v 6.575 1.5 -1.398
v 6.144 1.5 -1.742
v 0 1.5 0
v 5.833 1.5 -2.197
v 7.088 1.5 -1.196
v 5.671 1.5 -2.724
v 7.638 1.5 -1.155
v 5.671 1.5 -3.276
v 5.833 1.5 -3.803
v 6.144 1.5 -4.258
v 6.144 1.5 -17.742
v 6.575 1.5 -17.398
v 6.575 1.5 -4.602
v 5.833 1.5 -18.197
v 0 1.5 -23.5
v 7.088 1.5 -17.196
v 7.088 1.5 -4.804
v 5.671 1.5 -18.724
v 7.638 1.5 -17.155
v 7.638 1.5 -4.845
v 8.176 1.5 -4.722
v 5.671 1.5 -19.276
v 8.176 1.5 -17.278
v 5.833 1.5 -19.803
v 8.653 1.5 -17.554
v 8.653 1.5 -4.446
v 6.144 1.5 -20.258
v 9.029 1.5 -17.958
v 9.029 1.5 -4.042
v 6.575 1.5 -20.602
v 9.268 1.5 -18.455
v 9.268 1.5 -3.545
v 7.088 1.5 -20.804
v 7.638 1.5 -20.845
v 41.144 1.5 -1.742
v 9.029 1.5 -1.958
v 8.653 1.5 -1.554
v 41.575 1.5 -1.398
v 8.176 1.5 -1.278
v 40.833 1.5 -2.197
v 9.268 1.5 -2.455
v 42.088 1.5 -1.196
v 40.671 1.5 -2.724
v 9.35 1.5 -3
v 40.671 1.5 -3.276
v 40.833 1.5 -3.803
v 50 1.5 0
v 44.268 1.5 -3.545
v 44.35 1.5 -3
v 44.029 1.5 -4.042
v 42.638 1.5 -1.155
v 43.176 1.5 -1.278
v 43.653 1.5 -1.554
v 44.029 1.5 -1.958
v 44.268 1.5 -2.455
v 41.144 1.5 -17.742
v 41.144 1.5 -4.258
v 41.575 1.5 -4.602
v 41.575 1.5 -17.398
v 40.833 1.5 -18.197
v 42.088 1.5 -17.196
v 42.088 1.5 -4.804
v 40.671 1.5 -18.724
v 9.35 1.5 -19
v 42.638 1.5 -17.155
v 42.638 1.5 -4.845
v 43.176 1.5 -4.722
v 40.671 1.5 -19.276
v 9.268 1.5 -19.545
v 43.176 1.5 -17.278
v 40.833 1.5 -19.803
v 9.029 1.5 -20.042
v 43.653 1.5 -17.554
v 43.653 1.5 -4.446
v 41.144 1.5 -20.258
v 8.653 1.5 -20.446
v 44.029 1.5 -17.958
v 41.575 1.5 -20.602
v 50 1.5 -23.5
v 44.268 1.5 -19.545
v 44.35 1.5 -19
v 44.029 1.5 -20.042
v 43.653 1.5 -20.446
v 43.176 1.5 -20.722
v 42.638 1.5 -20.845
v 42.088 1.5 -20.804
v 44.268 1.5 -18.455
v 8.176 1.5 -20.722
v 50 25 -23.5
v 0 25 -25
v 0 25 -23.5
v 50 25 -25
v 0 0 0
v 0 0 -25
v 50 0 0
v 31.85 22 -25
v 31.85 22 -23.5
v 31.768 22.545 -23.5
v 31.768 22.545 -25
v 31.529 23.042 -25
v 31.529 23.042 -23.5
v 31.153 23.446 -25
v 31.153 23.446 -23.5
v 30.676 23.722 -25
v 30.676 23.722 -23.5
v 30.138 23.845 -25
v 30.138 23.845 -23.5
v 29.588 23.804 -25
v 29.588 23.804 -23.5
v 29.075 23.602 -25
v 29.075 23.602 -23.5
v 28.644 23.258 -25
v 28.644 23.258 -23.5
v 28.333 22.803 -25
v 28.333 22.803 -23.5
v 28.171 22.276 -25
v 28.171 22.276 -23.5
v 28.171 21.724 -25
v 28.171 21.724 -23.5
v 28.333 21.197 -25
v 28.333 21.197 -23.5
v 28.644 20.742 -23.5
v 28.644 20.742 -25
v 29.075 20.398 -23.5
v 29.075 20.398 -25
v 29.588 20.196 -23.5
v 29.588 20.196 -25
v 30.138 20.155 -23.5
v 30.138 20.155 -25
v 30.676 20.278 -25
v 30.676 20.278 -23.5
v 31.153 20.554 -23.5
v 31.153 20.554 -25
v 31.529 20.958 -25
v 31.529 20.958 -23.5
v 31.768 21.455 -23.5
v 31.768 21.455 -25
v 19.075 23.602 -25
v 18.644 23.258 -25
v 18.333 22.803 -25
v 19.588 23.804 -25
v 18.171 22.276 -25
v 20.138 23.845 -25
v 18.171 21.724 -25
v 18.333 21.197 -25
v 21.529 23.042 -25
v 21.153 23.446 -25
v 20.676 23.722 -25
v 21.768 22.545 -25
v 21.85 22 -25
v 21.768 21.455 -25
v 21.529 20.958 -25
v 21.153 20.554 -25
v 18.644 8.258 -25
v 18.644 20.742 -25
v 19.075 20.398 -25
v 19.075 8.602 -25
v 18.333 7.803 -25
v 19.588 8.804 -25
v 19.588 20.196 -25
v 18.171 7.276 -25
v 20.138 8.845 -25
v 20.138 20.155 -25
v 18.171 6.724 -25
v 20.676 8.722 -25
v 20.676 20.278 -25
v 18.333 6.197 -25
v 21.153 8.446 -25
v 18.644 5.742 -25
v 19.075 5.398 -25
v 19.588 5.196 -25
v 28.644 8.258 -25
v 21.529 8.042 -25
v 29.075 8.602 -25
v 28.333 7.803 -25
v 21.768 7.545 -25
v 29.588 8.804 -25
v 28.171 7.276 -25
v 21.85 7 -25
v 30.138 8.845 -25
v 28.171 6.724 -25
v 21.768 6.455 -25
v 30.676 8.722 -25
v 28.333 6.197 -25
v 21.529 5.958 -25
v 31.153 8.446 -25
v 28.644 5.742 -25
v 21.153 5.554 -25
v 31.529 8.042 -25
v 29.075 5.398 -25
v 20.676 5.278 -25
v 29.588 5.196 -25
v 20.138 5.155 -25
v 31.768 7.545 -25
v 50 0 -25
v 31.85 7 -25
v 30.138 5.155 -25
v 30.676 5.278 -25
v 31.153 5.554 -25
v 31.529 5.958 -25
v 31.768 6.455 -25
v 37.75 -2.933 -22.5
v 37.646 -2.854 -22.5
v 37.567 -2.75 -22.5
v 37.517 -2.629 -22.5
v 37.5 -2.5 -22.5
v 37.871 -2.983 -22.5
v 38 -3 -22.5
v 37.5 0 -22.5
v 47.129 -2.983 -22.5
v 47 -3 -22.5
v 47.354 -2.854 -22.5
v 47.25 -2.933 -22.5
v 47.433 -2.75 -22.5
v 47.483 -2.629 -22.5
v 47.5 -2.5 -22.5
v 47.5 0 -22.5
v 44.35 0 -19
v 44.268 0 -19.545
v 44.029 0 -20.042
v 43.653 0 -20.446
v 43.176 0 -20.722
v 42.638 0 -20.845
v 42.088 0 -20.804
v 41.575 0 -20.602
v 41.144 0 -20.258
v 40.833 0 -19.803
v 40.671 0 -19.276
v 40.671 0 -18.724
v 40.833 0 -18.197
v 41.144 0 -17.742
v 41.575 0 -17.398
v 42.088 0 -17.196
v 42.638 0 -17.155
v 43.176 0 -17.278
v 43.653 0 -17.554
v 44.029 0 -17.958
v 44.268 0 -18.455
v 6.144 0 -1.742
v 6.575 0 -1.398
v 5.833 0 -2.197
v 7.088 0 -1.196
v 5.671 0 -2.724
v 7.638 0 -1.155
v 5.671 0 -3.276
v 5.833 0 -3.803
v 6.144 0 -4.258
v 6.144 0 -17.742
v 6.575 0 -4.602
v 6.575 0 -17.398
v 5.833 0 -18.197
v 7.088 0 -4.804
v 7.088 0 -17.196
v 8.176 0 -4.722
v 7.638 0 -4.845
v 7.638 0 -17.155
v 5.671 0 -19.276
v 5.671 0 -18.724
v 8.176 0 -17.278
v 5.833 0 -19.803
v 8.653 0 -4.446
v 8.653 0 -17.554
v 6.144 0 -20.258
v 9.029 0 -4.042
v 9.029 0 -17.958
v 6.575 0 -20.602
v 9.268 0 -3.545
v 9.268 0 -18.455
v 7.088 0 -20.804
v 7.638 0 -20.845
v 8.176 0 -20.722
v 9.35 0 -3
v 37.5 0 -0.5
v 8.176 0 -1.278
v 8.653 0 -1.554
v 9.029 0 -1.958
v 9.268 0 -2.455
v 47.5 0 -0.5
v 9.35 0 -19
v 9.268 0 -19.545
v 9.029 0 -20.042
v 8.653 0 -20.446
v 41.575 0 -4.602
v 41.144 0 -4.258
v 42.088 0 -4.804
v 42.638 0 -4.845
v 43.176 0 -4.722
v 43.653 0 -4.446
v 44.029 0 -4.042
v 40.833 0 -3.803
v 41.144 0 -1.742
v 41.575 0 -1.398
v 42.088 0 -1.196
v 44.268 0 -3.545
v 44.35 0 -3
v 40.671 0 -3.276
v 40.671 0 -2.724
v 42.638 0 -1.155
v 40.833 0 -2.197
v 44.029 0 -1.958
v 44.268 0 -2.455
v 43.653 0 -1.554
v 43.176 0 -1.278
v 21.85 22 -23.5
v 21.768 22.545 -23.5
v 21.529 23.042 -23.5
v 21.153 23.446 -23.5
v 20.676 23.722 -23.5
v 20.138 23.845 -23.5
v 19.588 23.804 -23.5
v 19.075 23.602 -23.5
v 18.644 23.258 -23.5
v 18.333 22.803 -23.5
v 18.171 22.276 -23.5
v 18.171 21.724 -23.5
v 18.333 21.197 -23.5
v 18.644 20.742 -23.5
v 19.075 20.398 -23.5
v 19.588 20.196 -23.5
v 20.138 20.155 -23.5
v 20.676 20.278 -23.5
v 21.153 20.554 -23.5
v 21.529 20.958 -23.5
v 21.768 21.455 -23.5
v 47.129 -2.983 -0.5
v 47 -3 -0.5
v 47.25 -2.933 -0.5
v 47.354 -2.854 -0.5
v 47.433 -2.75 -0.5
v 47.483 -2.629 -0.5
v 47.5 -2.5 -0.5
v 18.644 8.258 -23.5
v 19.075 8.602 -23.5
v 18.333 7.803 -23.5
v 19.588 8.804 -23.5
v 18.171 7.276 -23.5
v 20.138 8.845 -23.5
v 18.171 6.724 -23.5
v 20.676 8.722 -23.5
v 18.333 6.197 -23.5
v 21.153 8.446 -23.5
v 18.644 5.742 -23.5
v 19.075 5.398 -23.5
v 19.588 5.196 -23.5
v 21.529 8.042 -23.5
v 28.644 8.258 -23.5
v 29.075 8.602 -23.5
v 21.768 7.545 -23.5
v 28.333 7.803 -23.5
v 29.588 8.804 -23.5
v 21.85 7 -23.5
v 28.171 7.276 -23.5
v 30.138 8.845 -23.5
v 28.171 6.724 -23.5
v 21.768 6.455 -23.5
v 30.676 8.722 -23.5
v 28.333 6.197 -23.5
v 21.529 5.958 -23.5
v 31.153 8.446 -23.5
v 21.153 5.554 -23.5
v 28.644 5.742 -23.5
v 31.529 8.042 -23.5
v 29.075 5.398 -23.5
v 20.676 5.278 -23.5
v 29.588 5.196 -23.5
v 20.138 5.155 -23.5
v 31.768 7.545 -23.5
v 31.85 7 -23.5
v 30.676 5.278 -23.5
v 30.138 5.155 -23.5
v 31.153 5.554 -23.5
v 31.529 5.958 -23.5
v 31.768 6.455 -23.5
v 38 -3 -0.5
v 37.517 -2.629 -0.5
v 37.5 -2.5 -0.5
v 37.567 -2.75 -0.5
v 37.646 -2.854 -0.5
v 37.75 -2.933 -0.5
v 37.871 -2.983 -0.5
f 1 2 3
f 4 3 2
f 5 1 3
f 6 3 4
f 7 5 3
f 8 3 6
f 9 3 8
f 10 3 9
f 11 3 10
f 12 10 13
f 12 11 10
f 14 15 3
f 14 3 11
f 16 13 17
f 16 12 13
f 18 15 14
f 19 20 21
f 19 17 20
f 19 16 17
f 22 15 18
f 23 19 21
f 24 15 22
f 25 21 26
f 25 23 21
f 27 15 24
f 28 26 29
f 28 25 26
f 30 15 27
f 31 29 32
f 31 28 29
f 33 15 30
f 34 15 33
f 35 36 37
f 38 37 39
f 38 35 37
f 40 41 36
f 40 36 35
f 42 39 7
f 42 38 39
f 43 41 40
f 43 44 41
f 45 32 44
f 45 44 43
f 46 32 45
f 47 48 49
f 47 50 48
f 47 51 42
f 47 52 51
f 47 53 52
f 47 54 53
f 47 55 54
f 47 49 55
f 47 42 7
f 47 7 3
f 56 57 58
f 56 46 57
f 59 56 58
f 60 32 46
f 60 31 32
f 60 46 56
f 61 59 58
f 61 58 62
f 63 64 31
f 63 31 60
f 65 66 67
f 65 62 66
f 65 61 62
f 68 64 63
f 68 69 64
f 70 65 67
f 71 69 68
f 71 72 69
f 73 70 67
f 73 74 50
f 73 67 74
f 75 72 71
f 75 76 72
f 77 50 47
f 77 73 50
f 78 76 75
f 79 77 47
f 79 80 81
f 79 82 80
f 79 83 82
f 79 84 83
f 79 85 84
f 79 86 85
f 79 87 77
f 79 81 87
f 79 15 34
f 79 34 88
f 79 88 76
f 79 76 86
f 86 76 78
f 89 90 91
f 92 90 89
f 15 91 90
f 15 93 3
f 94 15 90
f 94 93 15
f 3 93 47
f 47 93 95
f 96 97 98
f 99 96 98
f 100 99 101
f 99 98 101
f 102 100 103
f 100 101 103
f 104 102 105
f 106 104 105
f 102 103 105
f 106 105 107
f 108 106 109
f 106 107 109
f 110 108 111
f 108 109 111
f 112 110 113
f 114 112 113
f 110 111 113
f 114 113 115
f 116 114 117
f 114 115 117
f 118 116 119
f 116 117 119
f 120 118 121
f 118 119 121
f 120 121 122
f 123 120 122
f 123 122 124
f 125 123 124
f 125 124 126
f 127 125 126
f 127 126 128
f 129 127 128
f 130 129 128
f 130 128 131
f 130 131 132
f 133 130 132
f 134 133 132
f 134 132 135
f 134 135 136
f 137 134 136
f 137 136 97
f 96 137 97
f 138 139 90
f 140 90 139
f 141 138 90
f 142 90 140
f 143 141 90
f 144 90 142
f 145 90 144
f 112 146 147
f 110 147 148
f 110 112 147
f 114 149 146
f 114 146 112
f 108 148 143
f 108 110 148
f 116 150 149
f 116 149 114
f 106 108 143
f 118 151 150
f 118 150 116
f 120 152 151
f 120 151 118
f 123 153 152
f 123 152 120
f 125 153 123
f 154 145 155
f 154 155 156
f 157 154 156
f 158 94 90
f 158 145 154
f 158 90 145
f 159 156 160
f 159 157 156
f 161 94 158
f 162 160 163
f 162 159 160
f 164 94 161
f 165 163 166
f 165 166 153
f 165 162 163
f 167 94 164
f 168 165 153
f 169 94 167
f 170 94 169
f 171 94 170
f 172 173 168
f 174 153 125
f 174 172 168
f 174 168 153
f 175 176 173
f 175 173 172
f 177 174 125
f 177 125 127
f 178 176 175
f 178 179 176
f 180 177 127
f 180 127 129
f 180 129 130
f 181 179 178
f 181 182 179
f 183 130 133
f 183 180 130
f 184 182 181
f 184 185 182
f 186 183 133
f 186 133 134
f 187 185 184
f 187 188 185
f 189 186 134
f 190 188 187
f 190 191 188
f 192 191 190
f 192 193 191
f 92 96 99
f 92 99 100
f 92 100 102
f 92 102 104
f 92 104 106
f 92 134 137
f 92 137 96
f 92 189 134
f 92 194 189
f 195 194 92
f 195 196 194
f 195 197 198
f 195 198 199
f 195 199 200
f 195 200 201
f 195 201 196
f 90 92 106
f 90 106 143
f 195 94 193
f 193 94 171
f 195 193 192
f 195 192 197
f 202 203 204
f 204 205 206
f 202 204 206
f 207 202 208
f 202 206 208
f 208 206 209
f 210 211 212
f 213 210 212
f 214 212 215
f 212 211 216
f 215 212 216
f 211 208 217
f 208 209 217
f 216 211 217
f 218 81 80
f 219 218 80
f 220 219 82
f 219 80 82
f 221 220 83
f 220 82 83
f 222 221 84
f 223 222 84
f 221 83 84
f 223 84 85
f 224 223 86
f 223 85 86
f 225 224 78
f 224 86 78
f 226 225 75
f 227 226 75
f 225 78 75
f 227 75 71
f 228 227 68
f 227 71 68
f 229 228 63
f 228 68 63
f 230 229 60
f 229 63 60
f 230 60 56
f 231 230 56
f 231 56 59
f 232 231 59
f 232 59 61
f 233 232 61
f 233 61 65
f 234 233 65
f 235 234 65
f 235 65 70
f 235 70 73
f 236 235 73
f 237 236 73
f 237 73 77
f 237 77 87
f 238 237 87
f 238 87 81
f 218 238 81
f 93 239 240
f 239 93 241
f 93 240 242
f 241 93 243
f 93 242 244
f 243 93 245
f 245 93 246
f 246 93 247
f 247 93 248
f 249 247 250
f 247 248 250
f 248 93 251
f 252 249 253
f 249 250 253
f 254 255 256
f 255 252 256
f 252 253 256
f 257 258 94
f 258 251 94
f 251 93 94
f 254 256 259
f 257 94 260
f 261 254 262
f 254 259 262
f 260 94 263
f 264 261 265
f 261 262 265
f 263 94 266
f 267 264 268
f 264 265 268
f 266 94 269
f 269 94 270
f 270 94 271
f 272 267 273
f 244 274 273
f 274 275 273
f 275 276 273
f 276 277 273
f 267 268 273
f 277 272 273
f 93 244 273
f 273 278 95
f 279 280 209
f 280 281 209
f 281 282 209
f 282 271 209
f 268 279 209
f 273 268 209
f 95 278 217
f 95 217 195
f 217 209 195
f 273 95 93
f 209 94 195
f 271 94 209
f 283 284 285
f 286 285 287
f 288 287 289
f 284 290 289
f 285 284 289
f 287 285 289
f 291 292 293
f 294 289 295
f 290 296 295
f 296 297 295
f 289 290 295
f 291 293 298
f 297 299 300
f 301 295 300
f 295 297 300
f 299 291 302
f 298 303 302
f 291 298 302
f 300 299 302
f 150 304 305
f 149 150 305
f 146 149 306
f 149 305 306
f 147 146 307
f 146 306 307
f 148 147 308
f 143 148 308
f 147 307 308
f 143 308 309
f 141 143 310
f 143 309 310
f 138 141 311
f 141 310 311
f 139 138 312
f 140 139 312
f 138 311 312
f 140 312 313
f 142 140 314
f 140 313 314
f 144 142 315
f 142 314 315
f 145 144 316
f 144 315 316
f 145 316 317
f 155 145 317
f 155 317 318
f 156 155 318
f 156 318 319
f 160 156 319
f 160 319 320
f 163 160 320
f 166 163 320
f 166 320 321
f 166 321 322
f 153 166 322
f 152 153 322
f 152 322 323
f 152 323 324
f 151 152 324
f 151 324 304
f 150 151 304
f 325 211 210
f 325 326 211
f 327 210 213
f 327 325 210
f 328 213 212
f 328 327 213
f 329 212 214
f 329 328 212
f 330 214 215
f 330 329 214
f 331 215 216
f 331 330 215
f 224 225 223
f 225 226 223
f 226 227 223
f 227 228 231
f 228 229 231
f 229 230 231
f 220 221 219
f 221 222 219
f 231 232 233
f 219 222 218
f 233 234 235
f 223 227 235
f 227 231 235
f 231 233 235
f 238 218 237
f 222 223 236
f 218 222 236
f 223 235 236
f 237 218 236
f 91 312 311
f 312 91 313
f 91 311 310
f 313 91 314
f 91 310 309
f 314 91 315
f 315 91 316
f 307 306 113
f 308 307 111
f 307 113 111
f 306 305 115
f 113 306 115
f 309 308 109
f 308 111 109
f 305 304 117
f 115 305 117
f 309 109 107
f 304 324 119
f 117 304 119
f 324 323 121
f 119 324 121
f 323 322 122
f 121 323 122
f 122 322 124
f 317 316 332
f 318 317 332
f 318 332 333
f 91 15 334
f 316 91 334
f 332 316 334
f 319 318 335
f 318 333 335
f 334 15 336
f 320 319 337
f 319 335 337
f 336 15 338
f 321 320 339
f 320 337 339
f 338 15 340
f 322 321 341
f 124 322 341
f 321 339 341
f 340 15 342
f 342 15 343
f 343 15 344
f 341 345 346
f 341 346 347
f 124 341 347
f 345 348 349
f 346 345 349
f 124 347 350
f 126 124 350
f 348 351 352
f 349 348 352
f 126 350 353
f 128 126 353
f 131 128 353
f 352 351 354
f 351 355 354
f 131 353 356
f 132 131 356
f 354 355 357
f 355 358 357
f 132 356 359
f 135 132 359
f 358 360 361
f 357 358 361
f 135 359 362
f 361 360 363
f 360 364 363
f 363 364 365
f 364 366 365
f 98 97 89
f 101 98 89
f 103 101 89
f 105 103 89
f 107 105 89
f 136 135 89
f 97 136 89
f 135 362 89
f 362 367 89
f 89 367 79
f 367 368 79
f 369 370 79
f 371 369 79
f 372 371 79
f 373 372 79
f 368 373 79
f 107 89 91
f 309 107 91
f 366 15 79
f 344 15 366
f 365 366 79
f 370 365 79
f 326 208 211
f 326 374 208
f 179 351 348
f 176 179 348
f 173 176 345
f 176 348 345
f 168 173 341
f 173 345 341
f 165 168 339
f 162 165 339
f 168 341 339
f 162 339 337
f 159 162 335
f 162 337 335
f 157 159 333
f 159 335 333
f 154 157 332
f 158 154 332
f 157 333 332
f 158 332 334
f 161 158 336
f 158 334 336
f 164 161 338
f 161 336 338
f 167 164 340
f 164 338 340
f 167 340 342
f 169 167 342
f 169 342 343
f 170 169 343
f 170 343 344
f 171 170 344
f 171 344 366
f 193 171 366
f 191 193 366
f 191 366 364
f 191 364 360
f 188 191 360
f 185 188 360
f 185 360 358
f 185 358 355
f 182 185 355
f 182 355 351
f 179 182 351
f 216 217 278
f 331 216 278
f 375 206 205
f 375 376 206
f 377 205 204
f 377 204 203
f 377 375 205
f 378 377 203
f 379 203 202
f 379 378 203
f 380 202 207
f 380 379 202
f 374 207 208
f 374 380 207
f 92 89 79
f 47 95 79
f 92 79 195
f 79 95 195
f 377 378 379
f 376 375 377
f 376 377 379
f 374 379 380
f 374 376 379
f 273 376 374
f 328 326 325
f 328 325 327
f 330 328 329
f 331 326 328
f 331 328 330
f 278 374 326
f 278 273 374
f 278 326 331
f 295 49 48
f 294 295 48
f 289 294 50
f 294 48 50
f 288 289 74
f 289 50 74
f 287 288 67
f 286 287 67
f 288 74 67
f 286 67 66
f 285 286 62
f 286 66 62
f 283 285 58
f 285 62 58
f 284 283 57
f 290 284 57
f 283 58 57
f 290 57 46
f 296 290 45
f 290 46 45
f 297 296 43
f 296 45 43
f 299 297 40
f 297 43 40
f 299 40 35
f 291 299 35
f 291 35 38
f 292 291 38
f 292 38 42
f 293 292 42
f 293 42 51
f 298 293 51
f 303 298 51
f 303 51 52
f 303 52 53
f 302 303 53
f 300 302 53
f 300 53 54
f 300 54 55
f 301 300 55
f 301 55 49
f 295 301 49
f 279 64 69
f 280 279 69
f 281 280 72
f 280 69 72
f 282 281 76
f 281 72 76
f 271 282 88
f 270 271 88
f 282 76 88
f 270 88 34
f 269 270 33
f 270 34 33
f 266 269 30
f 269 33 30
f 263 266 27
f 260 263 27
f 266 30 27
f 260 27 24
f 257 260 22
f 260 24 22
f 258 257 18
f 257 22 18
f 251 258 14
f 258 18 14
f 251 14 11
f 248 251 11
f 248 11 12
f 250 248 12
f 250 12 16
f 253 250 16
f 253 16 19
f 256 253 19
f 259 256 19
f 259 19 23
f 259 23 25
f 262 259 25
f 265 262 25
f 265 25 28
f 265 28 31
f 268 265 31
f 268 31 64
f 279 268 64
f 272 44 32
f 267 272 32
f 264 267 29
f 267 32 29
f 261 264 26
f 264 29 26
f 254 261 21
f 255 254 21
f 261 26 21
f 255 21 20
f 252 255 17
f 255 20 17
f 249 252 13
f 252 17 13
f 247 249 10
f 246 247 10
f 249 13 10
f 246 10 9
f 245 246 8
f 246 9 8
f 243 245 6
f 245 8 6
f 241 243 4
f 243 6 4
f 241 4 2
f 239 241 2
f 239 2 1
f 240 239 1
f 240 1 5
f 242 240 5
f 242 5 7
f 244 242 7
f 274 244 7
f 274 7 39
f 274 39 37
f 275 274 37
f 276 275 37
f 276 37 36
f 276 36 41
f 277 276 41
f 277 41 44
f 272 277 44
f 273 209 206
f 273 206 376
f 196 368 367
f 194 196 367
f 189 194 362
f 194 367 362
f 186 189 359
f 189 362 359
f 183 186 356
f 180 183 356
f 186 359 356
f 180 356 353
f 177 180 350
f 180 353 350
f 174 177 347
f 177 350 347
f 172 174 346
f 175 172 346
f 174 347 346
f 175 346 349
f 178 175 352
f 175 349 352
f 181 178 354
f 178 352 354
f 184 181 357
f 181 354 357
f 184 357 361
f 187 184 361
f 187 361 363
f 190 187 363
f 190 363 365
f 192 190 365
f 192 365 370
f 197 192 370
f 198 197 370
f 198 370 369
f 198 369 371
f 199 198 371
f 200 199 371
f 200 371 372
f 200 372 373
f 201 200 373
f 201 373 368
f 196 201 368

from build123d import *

# Parameters (mm, degrees)
SKETCH1_W           = 50
SKETCH1_H           = 25
BOSS_EXTRUDE1_DEPTH = 1.5
SKETCH3_W           = 50
SKETCH3_H           = 1.5
BOSS_EXTRUDE2_DEPTH = 23.5
SKETCH4_R           = 1.85
CUT_EXTRUDE1_DEPTH  = 23
SKETCH5_R           = 1.85
CUT_EXTRUDE2_DEPTH  = 23
SKETCH6_W           = 10
SKETCH6_H           = 22
BOSS_EXTRUDE3_DEPTH = 3
FILLET1_R           = 0.5


with BuildPart() as part:
    # Sketch1 → Boss-Extrude1 (new body)
    with BuildSketch(Plane(origin=(0, 0, 0), x_dir=(1, 0, 0), z_dir=(0, 1, 0))):
        with Locations((25, 12.5)):
            Rectangle(SKETCH1_W, SKETCH1_H)
    extrude(amount=BOSS_EXTRUDE1_DEPTH)

    # Sketch3 → Boss-Extrude2 (add)
    with BuildSketch(Plane(origin=(0, 1.5, 0), x_dir=(1, 0, 0), z_dir=(0, 1, 0))):
        with Locations((25, 24.25)):
            Rectangle(SKETCH3_W, SKETCH3_H)
    extrude(amount=BOSS_EXTRUDE2_DEPTH)

    # Sketch4 → Cut-Extrude1 (cut)
    with BuildSketch(Plane.XY.offset(-23.5)):
        with Locations((20, 22)):
            Circle(SKETCH4_R)
        with Locations((30, 22)):
            Circle(SKETCH4_R)
        with Locations((30, 7)):
            Circle(SKETCH4_R)
        with Locations((20, 7)):
            Circle(SKETCH4_R)
    extrude(amount=-CUT_EXTRUDE1_DEPTH, mode=Mode.SUBTRACT)

    # Sketch5 → Cut-Extrude2 (cut)
    with BuildSketch(Plane(origin=(0, 1.5, 0), x_dir=(1, 0, 0), z_dir=(0, 1, 0))):
        with Locations((7.5, 3)):
            Circle(SKETCH5_R)
        with Locations((7.5, 19)):
            Circle(SKETCH5_R)
        with Locations((42.5, 3)):
            Circle(SKETCH5_R)
        with Locations((42.5, 19)):
            Circle(SKETCH5_R)
    extrude(amount=-CUT_EXTRUDE2_DEPTH, mode=Mode.SUBTRACT)

    # Sketch6 → Boss-Extrude3 (add)
    with BuildSketch(Plane.XZ):
        with Locations((42.5, -11.5)):
            Rectangle(SKETCH6_W, SKETCH6_H)
    extrude(amount=BOSS_EXTRUDE3_DEPTH)

    # Fillet1
    fillet1_edges = [part.edges().sort_by_distance(p)[0] for p in [
        (47.5, -3, -11.5),
        (37.5, -3, -11.5),
    ]]
    fillet(fillet1_edges, radius=FILLET1_R)


solid = part.part
